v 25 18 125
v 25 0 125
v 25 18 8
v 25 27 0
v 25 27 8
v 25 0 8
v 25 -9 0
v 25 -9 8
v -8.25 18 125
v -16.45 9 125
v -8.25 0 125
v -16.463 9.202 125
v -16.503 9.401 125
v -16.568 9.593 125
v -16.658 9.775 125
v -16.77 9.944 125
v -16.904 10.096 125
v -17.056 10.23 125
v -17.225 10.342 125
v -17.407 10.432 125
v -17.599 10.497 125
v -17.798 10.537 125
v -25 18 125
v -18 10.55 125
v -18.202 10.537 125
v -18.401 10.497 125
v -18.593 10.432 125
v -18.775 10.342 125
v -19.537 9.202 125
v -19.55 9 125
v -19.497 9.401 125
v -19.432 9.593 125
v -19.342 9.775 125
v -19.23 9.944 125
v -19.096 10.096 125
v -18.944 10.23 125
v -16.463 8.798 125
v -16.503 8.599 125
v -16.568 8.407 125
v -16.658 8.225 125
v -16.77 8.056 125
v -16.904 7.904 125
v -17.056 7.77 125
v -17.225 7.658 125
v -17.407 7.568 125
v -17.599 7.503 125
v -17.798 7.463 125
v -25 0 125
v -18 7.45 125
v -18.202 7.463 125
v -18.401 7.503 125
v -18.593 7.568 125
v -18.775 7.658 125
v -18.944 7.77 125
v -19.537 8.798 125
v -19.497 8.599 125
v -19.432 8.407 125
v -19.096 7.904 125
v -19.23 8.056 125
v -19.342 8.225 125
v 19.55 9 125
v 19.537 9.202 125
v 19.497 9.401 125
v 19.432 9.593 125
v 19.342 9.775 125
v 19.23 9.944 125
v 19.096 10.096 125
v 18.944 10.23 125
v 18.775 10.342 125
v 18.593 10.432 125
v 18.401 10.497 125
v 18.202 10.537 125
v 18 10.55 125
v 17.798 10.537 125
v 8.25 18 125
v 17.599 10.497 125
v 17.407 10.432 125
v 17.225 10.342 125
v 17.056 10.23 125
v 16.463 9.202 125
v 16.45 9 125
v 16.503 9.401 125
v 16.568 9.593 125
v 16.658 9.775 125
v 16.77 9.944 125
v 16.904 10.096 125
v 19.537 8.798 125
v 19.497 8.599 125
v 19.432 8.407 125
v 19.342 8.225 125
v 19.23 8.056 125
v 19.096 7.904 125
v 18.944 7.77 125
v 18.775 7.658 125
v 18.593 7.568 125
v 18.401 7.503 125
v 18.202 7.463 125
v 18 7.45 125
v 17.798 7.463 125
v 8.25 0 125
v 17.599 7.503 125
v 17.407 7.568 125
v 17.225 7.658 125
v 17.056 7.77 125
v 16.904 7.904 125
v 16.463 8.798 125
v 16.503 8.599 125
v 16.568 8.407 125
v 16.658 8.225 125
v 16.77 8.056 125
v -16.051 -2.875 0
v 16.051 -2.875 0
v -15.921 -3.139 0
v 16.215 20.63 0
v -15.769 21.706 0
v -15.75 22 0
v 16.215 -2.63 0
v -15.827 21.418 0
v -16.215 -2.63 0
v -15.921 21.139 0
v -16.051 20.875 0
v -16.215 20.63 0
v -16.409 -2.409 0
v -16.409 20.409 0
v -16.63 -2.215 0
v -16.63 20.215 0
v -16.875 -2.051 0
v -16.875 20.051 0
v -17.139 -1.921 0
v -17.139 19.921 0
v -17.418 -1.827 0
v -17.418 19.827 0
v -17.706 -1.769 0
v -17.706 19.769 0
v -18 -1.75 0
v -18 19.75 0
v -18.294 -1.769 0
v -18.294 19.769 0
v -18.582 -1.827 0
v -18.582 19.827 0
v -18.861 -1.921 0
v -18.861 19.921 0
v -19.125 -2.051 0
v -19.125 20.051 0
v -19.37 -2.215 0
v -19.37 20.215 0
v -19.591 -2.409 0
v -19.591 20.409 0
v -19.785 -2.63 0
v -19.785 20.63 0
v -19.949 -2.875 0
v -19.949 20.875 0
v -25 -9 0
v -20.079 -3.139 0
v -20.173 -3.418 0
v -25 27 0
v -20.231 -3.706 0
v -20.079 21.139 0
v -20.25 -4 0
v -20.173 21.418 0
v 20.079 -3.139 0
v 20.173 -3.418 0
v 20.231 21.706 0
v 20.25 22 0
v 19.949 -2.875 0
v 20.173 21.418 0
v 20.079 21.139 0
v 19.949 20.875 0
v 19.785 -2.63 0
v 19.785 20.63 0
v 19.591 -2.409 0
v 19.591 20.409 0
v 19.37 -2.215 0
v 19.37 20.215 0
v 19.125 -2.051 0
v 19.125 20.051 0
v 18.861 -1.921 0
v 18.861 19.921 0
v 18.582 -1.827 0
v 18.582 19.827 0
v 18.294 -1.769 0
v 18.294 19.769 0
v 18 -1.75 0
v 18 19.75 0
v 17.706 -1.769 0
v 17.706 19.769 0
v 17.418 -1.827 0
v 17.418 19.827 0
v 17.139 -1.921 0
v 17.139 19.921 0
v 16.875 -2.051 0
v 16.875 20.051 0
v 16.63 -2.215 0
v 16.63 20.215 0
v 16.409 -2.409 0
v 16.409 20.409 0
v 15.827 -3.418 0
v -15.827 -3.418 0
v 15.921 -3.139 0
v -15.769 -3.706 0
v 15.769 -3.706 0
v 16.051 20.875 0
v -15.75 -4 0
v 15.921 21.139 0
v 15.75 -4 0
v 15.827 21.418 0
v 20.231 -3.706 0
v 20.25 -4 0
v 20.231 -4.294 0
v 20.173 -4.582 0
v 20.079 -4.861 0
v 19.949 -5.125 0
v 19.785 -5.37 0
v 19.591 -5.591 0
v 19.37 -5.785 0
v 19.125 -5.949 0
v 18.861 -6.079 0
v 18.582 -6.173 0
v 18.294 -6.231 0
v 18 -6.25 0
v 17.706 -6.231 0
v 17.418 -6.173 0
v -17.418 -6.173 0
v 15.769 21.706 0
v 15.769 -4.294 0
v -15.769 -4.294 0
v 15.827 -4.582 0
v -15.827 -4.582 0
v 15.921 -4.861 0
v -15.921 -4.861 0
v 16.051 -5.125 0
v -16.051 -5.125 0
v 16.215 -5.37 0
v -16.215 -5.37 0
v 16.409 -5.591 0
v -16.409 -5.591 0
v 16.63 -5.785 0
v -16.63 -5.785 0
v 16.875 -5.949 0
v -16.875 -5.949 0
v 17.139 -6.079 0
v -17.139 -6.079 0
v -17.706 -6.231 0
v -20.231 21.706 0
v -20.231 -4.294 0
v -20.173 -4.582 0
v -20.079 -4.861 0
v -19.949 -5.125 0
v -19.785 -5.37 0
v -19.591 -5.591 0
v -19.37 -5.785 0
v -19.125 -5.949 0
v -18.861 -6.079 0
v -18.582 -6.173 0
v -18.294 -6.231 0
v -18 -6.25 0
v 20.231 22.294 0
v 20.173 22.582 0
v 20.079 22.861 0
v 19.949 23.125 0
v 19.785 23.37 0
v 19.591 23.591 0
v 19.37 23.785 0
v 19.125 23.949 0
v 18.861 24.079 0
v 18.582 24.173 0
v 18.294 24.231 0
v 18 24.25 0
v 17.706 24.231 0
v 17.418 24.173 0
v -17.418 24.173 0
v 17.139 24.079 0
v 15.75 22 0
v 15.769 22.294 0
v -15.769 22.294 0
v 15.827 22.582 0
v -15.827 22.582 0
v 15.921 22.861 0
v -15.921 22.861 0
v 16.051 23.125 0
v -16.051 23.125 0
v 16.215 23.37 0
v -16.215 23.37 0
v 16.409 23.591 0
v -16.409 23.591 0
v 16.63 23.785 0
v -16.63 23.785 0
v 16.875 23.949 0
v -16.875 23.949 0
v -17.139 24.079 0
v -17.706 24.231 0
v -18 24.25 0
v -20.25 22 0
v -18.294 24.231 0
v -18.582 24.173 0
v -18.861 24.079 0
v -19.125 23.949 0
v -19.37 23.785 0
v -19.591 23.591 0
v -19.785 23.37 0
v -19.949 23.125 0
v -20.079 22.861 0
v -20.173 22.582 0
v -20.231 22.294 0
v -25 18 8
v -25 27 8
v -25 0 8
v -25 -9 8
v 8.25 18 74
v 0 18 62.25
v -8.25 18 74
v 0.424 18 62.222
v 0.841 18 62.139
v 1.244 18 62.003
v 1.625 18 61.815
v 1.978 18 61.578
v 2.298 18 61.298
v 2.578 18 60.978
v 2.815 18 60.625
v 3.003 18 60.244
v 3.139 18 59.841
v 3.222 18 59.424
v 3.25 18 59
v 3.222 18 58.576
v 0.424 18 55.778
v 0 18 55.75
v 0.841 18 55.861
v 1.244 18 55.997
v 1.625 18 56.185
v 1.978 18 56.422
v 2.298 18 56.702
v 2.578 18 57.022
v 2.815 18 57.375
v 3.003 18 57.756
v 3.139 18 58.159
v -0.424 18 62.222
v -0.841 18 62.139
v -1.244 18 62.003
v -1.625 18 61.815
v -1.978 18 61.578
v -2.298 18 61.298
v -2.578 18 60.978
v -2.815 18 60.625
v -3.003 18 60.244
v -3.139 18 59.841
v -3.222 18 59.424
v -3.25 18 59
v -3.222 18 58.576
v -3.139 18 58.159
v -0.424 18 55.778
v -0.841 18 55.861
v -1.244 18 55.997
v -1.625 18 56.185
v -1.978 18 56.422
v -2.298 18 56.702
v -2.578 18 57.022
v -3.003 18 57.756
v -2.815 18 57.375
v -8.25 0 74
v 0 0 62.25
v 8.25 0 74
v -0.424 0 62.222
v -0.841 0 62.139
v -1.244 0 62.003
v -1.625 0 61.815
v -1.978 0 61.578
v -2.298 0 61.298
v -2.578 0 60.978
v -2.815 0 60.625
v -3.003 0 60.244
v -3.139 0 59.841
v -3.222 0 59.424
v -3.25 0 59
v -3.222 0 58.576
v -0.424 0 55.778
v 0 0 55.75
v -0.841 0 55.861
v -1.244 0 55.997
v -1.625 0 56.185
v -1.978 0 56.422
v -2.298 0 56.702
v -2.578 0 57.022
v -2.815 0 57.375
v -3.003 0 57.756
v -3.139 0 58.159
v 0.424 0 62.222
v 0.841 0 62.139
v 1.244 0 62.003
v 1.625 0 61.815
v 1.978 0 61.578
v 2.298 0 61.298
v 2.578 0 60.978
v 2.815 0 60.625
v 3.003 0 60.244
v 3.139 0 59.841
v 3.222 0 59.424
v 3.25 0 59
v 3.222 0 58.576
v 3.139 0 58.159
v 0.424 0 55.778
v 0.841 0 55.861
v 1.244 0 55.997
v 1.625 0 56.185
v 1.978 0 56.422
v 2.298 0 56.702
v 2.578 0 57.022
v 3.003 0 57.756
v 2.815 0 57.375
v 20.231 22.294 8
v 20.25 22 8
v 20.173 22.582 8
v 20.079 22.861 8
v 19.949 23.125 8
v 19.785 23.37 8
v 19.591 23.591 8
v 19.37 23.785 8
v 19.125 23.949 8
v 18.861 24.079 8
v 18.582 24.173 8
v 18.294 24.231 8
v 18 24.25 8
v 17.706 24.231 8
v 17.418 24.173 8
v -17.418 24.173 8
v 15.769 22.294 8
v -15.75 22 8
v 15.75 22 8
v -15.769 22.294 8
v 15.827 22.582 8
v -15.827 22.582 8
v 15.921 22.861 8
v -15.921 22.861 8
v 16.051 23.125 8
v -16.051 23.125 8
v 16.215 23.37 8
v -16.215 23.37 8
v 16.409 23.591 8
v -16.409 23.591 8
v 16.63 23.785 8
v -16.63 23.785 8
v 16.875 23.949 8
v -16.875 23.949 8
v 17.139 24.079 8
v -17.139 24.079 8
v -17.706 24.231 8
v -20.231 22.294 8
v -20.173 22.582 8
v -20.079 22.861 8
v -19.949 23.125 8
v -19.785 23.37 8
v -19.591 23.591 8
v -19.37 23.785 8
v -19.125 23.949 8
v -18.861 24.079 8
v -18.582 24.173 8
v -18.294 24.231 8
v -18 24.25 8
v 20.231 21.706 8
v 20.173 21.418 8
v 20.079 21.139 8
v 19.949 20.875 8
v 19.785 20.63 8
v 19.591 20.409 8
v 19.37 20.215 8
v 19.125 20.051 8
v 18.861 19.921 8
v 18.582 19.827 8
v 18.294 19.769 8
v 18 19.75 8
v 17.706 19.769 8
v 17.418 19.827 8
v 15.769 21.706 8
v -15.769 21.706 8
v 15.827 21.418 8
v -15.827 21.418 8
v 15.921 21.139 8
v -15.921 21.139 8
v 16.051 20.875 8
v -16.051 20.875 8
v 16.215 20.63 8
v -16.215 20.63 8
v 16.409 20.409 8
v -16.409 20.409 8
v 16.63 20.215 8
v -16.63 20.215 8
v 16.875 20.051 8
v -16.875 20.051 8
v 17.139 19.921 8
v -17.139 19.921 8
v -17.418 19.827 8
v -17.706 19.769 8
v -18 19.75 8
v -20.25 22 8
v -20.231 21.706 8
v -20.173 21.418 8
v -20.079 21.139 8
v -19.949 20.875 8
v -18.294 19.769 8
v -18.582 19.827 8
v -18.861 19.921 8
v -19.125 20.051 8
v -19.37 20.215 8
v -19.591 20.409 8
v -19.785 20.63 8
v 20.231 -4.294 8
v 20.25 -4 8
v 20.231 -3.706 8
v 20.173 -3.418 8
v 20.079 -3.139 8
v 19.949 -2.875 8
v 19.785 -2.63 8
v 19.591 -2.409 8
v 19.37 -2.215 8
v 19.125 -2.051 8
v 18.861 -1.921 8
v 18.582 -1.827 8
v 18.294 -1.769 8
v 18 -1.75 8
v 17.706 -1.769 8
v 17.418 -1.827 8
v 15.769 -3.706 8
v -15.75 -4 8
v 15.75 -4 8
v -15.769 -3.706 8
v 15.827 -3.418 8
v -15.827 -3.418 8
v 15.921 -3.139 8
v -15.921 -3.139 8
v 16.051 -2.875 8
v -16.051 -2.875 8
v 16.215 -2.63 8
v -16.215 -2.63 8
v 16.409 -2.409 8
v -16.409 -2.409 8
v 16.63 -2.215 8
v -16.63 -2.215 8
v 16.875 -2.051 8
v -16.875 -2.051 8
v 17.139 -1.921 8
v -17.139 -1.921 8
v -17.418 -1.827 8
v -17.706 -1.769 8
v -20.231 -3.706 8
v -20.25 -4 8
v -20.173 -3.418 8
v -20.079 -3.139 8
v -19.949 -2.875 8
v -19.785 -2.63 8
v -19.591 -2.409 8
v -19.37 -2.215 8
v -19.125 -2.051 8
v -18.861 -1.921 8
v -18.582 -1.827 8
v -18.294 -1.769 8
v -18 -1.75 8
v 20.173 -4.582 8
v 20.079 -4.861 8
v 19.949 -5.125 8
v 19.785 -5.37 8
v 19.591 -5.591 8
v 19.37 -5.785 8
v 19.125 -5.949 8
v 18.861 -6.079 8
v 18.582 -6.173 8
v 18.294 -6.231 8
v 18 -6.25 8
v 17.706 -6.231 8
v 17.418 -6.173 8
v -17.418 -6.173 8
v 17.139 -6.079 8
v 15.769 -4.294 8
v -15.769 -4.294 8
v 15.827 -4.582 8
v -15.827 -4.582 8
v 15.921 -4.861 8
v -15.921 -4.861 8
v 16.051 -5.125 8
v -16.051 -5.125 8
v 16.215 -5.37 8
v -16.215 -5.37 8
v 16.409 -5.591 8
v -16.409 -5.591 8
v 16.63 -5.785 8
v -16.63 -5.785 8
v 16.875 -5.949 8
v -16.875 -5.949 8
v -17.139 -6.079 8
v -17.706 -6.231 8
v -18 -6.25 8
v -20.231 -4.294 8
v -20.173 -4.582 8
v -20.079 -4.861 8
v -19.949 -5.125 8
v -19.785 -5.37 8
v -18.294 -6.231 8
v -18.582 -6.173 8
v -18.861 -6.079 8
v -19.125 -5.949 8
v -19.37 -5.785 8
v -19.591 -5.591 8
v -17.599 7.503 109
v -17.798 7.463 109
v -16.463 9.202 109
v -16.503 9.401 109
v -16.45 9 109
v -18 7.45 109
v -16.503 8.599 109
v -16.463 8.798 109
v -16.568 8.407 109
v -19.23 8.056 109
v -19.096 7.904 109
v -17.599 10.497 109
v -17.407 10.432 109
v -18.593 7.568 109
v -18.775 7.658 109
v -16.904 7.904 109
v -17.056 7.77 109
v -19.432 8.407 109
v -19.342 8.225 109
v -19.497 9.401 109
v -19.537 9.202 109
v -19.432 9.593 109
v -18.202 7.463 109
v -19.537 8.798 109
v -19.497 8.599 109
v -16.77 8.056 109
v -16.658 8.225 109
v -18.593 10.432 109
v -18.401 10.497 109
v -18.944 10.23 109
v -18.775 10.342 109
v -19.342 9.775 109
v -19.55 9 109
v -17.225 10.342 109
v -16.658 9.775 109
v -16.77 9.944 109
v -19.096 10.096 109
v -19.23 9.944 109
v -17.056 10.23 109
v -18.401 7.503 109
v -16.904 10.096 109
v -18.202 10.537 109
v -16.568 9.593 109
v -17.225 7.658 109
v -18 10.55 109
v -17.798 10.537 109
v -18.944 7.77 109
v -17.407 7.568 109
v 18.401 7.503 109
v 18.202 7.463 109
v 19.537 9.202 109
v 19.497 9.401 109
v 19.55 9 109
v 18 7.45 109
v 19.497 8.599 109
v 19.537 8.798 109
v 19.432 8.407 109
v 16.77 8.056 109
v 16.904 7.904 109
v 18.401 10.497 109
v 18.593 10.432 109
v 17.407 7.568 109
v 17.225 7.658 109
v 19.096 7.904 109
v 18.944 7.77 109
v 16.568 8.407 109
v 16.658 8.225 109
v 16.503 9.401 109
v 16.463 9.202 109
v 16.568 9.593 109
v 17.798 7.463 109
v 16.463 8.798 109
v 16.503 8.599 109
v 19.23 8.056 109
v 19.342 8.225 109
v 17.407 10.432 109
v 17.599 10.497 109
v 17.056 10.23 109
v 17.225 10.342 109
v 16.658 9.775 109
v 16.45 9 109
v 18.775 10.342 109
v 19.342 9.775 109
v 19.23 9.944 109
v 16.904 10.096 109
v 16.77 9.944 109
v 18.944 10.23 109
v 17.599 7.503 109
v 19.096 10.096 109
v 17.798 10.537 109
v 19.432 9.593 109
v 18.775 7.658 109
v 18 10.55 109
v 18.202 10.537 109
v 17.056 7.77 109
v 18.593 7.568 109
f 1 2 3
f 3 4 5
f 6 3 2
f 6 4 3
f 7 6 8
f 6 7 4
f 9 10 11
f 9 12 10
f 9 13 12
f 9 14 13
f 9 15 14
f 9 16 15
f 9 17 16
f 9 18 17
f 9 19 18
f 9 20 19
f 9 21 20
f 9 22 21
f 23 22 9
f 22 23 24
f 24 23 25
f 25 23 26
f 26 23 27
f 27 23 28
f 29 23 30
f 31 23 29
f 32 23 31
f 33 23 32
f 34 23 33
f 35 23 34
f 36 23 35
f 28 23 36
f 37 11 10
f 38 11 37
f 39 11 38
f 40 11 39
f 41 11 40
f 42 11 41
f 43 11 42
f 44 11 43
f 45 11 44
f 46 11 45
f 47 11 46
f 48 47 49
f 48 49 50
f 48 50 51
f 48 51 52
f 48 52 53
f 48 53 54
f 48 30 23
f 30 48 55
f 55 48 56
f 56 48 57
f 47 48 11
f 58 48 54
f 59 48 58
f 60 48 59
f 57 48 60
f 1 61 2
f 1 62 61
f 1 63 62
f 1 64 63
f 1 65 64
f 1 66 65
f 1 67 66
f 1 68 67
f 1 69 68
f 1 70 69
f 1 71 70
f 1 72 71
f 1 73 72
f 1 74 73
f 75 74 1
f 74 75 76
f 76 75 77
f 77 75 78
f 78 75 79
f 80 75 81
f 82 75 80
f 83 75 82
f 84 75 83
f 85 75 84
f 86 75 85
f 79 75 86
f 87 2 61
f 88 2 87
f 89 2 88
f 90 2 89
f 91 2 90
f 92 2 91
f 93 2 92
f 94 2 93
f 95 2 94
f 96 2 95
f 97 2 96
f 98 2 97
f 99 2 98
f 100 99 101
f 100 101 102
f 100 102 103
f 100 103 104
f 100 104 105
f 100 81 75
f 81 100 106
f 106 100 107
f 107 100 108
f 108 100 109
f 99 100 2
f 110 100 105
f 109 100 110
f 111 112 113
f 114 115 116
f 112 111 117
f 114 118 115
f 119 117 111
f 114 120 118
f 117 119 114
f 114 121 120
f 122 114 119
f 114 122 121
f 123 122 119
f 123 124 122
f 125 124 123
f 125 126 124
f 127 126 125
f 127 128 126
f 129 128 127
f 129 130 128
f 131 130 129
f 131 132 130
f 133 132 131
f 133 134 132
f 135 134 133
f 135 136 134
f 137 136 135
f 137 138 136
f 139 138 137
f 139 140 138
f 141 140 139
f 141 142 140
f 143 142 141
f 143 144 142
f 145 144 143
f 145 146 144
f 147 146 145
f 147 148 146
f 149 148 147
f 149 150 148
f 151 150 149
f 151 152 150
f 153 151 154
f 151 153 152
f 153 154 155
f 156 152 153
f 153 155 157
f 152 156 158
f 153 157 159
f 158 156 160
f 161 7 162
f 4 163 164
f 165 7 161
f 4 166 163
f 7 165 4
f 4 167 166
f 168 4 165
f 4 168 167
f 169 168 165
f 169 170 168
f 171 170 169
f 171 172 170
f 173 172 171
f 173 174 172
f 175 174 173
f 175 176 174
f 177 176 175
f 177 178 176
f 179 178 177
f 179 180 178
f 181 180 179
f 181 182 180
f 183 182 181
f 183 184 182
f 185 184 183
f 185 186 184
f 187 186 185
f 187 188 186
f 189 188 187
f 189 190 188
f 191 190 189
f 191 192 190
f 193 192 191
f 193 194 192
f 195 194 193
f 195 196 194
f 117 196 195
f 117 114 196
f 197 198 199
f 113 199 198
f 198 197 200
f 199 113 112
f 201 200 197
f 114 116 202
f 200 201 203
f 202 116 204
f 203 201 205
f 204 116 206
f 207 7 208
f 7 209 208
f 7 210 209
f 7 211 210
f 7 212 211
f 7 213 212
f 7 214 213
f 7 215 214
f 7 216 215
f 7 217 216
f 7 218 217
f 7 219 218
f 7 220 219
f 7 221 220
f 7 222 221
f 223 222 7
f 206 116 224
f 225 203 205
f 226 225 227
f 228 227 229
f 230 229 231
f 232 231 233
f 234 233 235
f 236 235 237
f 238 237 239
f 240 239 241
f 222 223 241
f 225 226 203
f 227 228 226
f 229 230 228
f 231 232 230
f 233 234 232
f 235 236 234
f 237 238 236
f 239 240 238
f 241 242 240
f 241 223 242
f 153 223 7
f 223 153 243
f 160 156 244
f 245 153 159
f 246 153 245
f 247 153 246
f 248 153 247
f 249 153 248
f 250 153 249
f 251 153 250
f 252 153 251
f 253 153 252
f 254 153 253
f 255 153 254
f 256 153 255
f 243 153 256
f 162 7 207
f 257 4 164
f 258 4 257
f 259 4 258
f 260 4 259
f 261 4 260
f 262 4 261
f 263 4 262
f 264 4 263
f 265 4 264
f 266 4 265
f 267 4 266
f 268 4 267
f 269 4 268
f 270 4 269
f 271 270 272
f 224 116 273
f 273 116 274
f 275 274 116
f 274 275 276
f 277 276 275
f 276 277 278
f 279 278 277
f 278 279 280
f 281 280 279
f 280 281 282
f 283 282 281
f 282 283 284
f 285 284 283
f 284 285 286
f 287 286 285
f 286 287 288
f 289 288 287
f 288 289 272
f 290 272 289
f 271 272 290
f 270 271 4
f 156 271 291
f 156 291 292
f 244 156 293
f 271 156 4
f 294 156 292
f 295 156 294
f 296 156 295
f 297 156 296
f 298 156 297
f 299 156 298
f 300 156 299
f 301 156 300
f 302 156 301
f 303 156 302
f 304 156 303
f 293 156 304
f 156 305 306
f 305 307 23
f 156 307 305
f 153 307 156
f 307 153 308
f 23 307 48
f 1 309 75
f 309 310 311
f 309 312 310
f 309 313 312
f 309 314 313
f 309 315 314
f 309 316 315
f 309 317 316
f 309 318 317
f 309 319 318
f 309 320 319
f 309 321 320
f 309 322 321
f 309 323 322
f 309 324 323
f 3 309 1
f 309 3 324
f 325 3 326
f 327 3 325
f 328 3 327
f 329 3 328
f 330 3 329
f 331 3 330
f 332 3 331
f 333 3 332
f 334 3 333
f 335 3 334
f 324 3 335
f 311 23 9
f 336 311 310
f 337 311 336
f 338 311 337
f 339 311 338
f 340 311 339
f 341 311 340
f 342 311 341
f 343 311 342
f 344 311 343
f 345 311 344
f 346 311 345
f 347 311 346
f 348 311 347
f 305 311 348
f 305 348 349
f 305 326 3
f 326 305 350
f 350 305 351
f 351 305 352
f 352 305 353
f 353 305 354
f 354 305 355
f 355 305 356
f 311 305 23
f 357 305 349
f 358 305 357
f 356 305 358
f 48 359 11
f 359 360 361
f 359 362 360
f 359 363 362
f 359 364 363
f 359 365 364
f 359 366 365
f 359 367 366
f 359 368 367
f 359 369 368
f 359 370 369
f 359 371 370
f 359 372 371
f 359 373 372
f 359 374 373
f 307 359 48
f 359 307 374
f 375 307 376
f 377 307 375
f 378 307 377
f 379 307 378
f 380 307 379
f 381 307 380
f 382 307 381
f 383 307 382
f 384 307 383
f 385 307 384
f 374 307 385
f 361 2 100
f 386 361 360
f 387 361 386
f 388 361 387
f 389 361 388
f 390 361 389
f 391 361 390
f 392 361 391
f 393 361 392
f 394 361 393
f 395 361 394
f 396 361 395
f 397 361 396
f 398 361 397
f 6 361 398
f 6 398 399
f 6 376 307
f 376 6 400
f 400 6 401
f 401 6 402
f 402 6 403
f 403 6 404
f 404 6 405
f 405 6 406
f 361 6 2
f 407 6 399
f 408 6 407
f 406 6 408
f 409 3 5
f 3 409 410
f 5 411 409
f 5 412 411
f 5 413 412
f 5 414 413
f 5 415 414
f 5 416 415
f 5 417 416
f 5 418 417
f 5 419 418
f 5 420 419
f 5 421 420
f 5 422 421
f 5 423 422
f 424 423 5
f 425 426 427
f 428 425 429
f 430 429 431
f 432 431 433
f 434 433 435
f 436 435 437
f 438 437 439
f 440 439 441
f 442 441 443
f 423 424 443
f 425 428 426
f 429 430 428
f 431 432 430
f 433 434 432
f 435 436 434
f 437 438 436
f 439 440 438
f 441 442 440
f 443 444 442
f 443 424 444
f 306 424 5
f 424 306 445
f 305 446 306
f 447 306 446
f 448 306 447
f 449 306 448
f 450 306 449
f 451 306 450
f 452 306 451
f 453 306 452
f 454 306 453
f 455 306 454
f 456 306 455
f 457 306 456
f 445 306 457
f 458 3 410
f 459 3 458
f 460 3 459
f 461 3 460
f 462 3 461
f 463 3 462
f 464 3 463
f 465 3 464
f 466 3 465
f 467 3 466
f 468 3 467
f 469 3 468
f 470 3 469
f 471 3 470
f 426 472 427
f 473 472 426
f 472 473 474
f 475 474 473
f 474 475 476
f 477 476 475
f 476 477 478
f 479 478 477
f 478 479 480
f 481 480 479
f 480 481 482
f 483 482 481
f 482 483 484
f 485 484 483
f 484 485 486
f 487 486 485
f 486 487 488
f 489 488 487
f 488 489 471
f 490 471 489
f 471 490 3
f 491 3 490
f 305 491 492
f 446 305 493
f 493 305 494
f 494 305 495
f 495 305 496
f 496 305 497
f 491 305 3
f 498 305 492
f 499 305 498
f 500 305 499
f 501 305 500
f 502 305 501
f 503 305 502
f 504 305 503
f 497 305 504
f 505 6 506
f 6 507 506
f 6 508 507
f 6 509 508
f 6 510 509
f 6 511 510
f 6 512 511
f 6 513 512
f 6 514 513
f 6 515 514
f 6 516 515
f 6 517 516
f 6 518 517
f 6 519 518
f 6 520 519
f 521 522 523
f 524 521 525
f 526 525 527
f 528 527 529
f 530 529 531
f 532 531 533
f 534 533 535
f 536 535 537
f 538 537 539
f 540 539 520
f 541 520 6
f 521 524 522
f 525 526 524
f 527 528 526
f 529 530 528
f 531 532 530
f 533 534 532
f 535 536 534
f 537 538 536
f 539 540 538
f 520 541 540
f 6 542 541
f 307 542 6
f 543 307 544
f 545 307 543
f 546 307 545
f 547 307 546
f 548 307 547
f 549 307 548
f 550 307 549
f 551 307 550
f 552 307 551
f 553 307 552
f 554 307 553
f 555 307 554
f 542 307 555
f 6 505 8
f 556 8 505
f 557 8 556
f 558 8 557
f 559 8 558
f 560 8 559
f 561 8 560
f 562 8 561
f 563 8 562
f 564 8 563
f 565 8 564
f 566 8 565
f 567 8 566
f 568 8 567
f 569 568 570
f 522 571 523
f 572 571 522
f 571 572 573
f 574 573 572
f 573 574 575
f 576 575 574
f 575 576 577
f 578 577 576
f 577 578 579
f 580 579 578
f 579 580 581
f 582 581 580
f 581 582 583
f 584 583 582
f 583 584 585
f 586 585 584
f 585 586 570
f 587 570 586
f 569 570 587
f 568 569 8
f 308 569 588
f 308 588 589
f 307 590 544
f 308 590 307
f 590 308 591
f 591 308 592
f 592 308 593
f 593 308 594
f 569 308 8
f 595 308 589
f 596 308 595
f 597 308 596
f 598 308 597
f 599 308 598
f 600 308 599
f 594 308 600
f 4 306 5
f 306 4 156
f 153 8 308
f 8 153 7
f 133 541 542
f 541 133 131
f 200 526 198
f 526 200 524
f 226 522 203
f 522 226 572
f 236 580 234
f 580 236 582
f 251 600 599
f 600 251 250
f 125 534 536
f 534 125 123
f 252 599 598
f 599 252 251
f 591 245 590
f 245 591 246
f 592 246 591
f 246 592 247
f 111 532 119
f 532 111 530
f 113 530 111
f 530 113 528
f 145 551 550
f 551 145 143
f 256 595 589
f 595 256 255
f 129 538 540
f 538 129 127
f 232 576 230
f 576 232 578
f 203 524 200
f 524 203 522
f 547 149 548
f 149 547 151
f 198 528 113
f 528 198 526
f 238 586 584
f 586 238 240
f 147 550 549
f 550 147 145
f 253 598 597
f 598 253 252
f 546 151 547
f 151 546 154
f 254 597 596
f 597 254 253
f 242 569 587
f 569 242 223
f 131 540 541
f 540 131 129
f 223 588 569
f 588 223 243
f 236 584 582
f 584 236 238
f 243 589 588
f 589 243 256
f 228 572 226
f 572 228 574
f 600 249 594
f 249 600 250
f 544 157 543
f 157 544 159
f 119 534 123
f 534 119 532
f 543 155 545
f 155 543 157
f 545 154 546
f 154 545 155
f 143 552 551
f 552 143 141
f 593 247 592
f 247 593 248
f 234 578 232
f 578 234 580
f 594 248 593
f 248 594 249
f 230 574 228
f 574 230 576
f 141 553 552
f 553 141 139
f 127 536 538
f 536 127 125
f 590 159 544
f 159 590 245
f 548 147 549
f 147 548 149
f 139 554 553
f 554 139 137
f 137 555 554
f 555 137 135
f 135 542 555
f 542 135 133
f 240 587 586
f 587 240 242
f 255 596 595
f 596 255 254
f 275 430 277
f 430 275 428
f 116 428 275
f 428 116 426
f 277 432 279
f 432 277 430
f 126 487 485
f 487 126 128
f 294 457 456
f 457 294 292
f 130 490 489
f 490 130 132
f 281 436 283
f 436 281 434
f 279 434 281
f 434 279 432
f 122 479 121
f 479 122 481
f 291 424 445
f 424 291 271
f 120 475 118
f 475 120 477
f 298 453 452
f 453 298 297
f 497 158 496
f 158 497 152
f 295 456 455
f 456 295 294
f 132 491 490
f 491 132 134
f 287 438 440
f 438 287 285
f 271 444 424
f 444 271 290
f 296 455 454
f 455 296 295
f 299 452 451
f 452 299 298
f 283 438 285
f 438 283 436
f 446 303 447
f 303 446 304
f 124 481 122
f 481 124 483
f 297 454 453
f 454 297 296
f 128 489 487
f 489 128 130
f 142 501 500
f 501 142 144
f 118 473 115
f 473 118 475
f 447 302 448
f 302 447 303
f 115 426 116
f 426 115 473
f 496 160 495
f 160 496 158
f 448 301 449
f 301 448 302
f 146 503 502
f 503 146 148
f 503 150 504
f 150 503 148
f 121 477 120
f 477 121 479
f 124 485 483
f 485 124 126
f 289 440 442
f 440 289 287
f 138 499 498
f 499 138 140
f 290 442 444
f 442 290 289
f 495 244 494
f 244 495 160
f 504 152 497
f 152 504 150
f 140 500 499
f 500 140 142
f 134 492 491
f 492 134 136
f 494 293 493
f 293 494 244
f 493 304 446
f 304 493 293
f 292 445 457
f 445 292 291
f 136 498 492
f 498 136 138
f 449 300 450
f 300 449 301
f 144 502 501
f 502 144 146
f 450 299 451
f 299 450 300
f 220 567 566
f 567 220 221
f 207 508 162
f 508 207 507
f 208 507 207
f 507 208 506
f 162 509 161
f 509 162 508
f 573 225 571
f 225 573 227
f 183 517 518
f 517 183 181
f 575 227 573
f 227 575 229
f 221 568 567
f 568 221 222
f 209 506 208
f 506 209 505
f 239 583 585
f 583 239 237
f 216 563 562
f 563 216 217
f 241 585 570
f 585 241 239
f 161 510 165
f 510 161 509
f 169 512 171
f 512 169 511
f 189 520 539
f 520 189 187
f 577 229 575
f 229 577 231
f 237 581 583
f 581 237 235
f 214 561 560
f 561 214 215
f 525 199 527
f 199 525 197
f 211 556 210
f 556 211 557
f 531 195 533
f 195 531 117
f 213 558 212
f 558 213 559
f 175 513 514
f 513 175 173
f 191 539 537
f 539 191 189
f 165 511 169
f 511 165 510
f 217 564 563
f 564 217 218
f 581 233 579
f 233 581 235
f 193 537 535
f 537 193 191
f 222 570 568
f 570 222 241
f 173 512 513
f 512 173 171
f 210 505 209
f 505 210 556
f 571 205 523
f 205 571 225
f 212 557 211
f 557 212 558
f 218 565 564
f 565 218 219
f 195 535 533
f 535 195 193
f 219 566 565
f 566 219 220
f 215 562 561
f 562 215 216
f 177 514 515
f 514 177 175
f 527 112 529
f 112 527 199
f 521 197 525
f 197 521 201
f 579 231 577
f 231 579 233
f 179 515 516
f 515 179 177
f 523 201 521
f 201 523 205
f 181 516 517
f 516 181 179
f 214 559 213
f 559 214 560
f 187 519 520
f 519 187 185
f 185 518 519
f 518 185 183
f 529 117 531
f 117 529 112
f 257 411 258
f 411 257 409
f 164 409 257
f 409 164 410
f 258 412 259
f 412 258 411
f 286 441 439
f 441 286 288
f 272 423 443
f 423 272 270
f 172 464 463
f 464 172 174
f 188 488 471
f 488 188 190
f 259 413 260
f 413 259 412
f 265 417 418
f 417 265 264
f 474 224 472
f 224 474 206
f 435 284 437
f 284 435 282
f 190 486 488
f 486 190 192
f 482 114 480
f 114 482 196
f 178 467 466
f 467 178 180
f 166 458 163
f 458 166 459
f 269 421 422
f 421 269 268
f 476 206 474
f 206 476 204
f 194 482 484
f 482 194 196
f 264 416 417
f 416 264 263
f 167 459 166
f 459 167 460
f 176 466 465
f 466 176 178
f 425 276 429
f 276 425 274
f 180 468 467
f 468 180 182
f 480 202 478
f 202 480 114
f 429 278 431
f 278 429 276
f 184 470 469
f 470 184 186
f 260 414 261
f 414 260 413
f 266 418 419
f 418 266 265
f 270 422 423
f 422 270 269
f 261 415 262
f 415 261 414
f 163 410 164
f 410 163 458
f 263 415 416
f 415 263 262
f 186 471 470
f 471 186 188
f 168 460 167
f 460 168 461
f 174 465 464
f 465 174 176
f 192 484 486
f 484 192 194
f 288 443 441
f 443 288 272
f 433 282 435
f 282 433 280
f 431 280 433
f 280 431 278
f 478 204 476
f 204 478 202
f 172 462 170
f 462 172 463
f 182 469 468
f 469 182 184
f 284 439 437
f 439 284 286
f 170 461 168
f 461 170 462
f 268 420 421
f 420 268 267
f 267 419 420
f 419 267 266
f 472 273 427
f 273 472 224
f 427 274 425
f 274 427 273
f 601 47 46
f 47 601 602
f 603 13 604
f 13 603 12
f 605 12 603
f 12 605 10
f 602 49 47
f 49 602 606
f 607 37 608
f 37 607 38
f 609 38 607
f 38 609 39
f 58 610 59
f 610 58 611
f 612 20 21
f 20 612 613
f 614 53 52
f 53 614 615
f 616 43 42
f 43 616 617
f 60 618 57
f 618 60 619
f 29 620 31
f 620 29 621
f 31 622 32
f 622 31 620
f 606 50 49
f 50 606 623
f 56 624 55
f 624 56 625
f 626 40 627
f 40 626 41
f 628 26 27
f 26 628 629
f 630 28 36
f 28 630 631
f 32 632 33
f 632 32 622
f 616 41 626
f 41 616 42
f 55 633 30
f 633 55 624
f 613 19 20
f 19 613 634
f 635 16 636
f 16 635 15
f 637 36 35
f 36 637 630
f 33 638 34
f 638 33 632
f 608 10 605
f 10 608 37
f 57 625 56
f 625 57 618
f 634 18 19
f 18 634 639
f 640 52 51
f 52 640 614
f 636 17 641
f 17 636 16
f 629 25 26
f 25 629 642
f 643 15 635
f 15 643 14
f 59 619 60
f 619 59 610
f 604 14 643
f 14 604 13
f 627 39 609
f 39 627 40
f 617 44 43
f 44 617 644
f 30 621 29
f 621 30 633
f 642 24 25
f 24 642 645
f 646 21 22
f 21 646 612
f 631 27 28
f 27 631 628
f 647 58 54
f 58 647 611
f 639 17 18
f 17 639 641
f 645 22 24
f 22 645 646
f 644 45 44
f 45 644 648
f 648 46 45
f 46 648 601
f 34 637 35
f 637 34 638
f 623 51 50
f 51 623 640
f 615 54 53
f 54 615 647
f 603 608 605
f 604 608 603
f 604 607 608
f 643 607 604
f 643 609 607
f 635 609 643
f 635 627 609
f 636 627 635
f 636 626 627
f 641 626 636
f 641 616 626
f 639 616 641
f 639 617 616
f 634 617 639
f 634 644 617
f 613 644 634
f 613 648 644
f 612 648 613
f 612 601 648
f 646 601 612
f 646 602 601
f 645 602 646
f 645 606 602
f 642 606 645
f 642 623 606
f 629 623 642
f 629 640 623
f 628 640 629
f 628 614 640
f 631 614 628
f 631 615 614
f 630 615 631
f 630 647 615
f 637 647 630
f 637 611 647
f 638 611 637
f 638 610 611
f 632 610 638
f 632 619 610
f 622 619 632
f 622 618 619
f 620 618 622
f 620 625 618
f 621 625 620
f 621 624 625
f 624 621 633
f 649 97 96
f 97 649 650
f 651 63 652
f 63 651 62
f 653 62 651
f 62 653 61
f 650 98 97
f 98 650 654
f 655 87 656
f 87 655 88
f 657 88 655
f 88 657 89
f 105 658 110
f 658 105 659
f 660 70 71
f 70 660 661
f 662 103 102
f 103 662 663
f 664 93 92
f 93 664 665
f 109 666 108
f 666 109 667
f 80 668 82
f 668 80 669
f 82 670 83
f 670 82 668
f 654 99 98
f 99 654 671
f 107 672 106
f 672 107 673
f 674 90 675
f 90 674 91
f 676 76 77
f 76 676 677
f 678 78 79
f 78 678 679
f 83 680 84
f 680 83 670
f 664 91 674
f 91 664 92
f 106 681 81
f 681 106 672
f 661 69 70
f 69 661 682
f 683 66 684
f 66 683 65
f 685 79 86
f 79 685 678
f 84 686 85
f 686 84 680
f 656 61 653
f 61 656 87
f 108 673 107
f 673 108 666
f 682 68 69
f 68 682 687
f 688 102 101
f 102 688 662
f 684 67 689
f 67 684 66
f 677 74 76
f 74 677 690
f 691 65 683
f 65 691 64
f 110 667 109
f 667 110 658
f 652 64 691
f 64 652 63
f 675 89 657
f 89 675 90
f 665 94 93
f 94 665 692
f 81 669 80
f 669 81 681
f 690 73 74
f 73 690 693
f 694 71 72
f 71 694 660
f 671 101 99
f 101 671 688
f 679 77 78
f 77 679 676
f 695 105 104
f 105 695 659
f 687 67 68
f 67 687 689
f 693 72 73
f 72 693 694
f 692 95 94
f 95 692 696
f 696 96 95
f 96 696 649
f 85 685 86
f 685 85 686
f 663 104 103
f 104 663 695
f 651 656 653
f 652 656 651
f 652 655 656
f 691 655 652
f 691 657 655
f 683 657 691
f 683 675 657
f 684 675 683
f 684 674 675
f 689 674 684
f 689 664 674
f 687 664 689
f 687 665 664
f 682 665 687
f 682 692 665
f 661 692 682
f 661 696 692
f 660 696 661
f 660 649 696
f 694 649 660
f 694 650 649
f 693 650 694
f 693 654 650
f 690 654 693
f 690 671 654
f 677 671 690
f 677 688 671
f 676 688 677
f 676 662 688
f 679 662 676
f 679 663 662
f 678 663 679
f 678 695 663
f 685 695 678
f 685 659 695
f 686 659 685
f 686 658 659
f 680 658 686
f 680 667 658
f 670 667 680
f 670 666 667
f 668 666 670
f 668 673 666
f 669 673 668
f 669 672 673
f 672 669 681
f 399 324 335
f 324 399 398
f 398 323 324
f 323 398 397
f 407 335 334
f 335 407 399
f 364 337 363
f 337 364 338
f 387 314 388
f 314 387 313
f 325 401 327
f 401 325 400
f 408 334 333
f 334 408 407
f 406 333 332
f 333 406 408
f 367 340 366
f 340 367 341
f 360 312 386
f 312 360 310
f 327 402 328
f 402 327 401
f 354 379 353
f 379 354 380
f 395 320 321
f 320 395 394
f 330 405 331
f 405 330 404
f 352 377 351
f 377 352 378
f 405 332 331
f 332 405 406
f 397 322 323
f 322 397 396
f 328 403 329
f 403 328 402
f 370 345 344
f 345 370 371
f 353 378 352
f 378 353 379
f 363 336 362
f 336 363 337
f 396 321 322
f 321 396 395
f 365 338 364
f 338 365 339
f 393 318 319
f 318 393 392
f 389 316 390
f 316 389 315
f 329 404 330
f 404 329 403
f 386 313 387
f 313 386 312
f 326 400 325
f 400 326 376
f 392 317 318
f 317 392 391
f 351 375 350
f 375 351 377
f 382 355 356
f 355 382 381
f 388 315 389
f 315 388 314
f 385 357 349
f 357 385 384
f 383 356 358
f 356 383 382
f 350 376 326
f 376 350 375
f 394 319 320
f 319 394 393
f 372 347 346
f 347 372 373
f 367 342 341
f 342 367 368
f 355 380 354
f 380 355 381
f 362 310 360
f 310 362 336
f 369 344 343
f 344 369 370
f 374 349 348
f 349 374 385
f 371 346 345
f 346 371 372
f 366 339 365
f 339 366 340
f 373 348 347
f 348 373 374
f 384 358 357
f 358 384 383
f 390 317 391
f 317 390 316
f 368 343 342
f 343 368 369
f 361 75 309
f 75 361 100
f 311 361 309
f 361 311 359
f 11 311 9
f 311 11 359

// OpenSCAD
// Millimetres. Export each named part separately. See FIXTURE.md for assembly.
part = "cheek"; // [cheek, carriage, cap, end_plug, former_30, former_42]
$fn = 48;

module y_hole(x, z, diameter, length = 30) {
    translate([x, -1, z]) rotate([-90, 0, 0]) cylinder(d=diameter, h=length);
}

module cheek() {
    // x=0 is the nip. Positive x points inside the printer.
    difference() {
        union() {
            translate([-25, 0, 0]) cube([50, 18, 125]);
            translate([-25, -9, 0]) cube([50, 36, 8]);
        }
        y_hole(0, 59, 6.5);
        // The carriage is loaded from above. Slot bottom limits its descent.
        translate([-8.25, -1, 74]) cube([16.5, 20, 52]);
        for (x = [-18, 18]) {
            for (y = [-4, 22]) translate([x, y, -1]) cylinder(d=4.5, h=10);
            translate([x, 9, 109]) cylinder(d=3.1, h=17);
        }
    }
}

module carriage() {
    difference() {
        translate([-8, 0, -8]) cube([16, 18, 16]);
        y_hole(0, 0, 6.5);
        translate([0, 9, 5]) cylinder(d=8.2, h=4);
    }
}

module cap() {
    difference() {
        translate([-25, 0, 0]) cube([50, 18, 6]);
        for (x = [-18, 18]) translate([x, 9, -1]) cylinder(d=4.4, h=8);
        translate([0, 9, -1]) cylinder(d=4.5, h=8);
        translate([0, 9, -0.1]) cylinder(d=7.2/cos(30), h=3.2, $fn=6);
    }
}

module end_plug() {
    difference() {
        union() {
            cylinder(d=21.9, h=2);
            translate([0, 0, 2]) cylinder(d=19.8, h=11);
        }
        translate([0, 0, -1]) cylinder(d=6.4, h=15);
        // Seat an M6 nut from the tube side. 10.2 mm across flats.
        translate([0, 0, 7.4]) cylinder(d=10.2/cos(30), h=6, $fn=6);
    }
}

module former(angle) {
    // Six 40 mm sections make a straight bar spanning an A4 edge.
    linear_extrude(height=40) polygon([[0,0], [33,0], [33, 8], [0,8 + 33*tan(angle)]]);
}

if (part == "cheek") cheek();
if (part == "carriage") translate([8,0,8]) carriage();
if (part == "cap") translate([25,0,0]) cap();
if (part == "end_plug") end_plug();
if (part == "former_30") former(30);
if (part == "former_42") former(42);
